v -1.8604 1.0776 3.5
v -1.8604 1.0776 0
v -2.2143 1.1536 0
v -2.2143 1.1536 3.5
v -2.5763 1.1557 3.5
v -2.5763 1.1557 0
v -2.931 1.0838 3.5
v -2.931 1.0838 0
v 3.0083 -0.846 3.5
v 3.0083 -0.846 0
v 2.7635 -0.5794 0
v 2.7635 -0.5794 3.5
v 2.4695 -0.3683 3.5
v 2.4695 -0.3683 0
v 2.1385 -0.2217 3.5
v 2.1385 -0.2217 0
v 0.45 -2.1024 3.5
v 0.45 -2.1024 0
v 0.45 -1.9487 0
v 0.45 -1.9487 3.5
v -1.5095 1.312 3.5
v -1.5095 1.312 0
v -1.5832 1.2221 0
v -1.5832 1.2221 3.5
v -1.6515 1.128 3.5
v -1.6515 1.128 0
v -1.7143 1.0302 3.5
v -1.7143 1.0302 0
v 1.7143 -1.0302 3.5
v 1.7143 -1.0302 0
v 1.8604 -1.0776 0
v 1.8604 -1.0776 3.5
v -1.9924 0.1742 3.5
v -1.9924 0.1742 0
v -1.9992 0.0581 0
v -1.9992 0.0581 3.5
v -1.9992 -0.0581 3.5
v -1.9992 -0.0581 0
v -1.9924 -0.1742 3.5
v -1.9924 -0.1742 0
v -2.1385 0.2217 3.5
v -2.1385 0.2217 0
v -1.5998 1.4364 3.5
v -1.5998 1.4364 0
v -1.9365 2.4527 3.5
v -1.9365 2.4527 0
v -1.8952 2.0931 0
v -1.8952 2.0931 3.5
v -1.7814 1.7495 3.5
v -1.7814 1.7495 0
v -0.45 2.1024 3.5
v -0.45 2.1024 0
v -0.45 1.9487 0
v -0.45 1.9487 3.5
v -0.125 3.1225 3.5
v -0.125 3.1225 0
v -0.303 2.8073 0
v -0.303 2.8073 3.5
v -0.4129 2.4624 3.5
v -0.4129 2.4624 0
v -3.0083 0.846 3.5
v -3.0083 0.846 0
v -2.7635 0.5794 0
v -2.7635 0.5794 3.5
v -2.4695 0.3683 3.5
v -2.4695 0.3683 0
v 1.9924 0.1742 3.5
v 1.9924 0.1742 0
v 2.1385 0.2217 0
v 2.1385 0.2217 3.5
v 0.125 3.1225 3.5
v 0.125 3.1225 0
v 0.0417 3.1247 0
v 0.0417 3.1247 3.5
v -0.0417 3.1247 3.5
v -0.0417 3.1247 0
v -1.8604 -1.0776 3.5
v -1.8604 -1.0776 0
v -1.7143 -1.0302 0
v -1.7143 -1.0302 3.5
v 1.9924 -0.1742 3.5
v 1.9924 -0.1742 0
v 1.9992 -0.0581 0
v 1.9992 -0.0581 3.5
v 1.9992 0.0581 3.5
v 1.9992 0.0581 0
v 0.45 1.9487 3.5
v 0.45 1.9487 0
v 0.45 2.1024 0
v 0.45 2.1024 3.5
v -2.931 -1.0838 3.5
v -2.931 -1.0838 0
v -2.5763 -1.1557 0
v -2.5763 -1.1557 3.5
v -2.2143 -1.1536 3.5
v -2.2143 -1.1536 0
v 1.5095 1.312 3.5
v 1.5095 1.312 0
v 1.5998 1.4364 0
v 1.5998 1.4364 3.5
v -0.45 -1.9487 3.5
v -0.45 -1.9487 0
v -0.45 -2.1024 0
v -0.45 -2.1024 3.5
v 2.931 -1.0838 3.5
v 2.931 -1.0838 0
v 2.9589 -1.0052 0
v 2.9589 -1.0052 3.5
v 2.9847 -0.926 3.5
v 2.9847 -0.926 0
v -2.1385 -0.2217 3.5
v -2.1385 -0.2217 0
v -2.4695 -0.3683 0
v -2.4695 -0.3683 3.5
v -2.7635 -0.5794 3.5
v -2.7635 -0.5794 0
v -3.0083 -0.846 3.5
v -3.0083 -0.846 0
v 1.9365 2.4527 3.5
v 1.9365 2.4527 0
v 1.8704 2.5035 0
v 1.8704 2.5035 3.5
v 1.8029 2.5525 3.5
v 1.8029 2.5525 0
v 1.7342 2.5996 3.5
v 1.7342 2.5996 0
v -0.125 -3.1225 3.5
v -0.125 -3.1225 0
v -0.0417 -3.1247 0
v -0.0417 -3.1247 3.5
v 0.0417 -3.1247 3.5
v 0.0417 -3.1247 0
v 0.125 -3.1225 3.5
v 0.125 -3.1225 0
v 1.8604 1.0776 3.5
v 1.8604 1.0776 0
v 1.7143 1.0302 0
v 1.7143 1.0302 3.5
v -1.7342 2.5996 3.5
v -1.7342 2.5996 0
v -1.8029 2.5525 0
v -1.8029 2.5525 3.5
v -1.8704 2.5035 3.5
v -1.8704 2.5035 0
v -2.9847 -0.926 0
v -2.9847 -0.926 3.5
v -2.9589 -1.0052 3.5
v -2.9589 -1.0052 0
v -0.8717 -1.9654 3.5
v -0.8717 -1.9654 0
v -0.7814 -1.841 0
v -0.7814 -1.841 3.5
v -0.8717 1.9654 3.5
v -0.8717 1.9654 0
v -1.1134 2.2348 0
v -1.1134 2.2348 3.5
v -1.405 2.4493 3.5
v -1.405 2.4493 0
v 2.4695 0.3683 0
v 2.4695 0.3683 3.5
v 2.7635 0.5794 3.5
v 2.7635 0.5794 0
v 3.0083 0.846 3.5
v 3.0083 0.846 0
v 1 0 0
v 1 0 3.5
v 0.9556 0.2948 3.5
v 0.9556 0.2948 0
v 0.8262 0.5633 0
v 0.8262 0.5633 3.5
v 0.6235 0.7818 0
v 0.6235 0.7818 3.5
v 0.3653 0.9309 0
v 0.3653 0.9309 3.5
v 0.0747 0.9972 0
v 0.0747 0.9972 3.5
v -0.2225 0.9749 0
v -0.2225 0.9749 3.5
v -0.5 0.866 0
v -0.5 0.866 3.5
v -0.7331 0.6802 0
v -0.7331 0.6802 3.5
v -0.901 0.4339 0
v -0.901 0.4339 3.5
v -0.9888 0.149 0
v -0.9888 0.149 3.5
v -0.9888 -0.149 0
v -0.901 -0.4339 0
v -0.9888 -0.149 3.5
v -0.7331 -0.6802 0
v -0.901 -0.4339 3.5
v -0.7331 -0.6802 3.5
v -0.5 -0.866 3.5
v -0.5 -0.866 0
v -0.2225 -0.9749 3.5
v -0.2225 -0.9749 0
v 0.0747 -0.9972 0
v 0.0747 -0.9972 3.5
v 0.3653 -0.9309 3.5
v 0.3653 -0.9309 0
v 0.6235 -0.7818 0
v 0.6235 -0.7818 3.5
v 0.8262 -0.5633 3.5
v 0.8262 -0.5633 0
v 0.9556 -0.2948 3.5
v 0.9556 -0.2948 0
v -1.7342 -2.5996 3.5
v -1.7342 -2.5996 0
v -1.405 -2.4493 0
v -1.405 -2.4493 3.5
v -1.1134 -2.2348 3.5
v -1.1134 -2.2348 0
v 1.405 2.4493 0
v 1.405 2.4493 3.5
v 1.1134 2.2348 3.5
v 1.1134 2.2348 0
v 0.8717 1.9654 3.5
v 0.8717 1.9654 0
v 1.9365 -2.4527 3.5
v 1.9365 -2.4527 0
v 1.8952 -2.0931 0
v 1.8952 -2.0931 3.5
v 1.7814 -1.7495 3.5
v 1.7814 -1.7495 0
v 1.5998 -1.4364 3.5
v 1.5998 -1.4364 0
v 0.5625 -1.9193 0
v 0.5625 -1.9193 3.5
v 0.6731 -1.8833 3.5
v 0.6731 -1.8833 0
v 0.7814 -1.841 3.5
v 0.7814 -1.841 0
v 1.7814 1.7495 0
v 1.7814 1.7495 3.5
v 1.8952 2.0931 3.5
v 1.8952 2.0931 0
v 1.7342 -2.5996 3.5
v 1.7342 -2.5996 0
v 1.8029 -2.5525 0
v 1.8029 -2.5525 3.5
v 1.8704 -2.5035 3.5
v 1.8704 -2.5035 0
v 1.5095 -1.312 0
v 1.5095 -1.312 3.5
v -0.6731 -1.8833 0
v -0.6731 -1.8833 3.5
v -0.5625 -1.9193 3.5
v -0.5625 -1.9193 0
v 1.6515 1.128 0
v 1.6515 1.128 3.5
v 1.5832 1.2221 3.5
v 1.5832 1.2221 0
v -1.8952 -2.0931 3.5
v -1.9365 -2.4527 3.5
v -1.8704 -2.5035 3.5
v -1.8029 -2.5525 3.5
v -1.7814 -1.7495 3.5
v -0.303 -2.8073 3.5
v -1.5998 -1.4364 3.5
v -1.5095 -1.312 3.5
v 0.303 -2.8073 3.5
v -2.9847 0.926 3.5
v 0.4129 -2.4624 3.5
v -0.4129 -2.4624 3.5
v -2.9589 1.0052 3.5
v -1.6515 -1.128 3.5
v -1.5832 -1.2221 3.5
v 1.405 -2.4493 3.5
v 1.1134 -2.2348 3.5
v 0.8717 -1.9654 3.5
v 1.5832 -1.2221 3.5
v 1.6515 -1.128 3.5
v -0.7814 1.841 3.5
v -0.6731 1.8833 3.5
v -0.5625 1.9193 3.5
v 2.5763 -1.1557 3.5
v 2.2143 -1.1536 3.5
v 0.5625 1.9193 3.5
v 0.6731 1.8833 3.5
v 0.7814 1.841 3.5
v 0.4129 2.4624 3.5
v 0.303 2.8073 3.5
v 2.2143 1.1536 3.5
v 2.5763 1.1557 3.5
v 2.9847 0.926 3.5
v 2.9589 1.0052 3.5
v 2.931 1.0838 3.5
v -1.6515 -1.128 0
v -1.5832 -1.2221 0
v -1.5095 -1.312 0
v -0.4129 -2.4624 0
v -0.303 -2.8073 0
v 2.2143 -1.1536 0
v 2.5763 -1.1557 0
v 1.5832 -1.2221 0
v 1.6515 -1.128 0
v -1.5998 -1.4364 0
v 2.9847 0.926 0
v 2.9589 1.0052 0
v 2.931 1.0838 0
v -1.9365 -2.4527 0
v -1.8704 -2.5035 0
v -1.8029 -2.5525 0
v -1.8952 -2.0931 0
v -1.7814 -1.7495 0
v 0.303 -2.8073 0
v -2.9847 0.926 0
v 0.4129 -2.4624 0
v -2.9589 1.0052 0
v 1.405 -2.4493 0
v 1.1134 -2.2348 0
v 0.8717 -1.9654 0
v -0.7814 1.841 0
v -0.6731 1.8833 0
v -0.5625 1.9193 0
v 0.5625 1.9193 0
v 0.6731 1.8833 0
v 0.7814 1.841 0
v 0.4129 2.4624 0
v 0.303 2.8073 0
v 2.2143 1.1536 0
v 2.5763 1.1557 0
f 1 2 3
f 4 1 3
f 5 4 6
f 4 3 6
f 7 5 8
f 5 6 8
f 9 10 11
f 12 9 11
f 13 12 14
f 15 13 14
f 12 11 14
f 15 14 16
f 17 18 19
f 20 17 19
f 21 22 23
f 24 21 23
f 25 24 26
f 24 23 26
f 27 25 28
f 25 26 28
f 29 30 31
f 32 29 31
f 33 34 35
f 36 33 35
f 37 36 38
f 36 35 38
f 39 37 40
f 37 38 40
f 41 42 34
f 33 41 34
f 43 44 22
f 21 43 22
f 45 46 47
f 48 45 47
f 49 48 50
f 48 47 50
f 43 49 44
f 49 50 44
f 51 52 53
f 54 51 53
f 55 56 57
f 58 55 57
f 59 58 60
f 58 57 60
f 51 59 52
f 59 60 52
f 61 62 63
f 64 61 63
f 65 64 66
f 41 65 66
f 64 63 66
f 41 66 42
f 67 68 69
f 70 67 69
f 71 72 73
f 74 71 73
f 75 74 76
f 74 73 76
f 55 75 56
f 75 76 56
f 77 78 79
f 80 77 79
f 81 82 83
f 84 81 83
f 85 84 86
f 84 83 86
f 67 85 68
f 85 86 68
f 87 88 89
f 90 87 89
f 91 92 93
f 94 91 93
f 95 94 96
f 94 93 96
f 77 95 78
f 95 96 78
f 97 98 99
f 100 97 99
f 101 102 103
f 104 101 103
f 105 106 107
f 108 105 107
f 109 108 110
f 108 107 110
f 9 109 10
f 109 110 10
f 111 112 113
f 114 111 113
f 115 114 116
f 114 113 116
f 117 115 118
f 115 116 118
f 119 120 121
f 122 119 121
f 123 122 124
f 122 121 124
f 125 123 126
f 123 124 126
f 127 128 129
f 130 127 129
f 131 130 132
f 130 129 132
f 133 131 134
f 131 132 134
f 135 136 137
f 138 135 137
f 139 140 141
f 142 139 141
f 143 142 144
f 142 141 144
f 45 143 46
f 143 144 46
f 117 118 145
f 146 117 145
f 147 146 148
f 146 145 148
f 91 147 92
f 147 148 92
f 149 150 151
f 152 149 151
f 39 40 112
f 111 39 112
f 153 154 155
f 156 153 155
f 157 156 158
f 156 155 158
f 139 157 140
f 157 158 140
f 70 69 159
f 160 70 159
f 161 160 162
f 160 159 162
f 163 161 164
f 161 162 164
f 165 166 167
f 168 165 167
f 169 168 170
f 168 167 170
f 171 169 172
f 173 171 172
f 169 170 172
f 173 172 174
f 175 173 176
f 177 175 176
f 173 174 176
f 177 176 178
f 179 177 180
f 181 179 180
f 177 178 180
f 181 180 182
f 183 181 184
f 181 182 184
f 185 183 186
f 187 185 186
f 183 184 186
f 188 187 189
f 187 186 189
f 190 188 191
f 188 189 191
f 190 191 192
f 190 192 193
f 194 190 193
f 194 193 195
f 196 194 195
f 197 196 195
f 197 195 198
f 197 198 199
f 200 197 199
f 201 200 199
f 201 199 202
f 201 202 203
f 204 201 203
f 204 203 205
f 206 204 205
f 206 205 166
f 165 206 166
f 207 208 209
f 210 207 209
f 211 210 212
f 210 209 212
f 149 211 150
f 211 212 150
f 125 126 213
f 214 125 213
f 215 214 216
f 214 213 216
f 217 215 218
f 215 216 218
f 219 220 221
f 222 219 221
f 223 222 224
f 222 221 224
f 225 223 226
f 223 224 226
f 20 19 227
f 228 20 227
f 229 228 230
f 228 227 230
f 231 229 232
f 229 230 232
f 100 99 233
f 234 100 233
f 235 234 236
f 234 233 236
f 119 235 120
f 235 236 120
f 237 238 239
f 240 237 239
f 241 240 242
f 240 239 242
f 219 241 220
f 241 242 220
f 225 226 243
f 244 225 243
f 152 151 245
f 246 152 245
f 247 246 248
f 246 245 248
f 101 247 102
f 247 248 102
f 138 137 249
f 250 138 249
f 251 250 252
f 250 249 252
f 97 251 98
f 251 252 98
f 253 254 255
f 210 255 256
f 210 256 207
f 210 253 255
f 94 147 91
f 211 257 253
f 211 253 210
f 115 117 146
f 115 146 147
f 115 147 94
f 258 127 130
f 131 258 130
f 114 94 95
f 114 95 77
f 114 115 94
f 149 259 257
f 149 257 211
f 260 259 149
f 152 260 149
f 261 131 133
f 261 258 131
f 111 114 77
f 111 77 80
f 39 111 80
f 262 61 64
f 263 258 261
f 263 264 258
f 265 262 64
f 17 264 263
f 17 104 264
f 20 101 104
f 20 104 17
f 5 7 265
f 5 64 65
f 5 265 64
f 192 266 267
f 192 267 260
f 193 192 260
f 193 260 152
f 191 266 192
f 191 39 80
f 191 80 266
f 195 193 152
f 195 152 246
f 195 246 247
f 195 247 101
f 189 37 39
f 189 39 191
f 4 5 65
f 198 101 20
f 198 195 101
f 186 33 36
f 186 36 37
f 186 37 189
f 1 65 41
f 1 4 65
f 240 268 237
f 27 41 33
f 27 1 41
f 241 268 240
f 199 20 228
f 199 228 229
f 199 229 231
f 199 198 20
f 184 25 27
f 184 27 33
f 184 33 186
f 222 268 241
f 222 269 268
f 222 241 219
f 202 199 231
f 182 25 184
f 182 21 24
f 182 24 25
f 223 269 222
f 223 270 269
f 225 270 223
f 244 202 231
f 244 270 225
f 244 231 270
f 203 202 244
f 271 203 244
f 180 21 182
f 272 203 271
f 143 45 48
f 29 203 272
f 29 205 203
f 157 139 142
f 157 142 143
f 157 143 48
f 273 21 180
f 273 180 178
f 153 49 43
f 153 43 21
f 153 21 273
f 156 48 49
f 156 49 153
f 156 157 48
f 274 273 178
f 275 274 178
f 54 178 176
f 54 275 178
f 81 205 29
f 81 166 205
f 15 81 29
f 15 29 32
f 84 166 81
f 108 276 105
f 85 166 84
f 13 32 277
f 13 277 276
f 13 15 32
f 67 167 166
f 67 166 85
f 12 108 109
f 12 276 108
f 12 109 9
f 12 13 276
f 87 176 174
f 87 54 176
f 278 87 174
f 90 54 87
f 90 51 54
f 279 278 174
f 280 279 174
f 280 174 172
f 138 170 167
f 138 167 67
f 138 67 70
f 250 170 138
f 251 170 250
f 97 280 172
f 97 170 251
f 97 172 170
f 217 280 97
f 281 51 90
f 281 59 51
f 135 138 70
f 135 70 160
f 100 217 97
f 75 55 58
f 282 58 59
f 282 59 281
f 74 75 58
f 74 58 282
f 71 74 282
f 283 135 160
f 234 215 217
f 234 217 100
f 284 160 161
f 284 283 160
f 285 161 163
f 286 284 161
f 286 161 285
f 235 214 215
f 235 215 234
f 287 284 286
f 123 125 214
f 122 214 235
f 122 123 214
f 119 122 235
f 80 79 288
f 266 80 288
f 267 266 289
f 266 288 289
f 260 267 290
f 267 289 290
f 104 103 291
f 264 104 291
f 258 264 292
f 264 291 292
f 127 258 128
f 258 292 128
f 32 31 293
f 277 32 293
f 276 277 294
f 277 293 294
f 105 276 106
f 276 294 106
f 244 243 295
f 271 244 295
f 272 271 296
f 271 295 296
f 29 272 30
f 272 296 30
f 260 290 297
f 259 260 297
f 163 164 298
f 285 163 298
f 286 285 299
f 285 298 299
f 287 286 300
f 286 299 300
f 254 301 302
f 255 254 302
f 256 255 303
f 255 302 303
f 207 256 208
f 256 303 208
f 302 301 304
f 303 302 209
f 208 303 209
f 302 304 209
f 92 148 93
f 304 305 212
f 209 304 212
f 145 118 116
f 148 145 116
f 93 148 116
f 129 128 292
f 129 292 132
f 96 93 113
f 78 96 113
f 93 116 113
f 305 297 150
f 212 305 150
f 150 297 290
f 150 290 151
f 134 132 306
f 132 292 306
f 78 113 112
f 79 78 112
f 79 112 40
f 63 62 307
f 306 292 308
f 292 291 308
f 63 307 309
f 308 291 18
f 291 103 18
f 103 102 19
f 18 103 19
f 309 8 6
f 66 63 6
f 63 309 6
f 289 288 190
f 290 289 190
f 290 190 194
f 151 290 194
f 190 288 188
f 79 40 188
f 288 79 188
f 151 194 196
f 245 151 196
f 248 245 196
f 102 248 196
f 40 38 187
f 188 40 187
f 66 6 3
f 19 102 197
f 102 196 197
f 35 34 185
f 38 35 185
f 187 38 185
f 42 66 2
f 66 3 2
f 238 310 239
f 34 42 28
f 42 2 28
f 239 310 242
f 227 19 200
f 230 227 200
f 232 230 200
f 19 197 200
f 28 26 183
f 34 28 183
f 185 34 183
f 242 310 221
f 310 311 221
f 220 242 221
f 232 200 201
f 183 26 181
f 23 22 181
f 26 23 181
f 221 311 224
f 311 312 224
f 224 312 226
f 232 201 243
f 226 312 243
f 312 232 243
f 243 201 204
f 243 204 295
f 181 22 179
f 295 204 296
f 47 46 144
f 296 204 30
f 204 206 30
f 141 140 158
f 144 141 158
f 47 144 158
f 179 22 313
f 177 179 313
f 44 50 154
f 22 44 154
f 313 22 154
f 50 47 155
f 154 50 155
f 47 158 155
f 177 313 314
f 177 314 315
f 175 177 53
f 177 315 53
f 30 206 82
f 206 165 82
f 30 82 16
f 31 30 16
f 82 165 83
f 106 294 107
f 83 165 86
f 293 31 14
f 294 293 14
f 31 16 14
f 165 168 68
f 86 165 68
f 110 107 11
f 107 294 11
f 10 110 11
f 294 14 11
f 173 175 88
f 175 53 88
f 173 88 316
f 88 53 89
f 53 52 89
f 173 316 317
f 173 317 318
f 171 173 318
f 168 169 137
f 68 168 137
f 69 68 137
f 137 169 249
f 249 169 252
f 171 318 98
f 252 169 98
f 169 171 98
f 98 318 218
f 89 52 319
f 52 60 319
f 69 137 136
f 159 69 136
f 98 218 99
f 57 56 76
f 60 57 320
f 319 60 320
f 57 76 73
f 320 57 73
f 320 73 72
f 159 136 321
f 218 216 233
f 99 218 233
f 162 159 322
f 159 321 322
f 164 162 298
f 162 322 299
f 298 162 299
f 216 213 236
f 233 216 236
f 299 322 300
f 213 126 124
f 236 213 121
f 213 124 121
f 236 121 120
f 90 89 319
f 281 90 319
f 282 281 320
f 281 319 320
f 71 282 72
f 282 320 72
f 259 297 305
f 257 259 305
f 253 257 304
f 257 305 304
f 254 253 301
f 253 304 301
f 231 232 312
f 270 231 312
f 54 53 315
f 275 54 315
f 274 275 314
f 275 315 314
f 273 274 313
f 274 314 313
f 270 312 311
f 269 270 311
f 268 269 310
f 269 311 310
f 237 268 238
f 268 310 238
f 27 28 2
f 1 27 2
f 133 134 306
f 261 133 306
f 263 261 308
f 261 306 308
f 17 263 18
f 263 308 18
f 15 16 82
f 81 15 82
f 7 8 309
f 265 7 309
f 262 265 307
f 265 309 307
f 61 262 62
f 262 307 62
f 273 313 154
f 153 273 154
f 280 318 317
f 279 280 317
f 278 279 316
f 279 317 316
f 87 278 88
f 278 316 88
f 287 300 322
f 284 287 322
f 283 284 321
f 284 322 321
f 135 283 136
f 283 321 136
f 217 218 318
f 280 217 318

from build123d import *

# Parameters (mm, degrees)
ESBO_O1_R                = 2
RESSALTO_EXTRUS_O1_DEPTH = 3.5
ESBO_O2_R                = 1
CORTE_EXTRUS_O1_DEPTH    = 6.573642863


with BuildPart() as part:
    # Esboço1 → Ressalto-extrusão1 (new body)
    with BuildSketch(Plane.XY):
        Circle(ESBO_O1_R)
        with BuildLine():
            ThreePointArc((-1.509485071, 1.312042233), (-1.175570505, 1.618033989), (-0.781369776, 1.84104896))
            Line((-0.781369776, 1.84104896), (-0.871690079, 1.965364192))
            ThreePointArc((-0.871690079, 1.965364192), (-1.253664041, 2.349535361), (-1.734231738, 2.599627912))
            ThreePointArc((-1.734231738, 2.599627912), (-1.836828913, 2.528178107), (-1.936485986, 2.452681599))
            ThreePointArc((-1.936485986, 2.452681599), (-1.847137421, 1.918351711), (-1.599805374, 1.436357465))
            Line((-1.599805374, 1.436357465), (-1.509485071, 1.312042233))
        make_face()
        with BuildLine():
            ThreePointArc((-0.45, 1.948717527), (0, 2), (0.45, 1.948717527))
            Line((0.45, 1.948717527), (0.45, 2.102379604))
            ThreePointArc((0.45, 2.102379604), (0.36678672, 2.63769927), (0.125, 3.122498999))
            ThreePointArc((0.125, 3.122498999), (0, 3.125), (-0.125, 3.122498999))
            ThreePointArc((-0.125, 3.122498999), (-0.36678672, 2.63769927), (-0.45, 2.102379604))
            Line((-0.45, 2.102379604), (-0.45, 1.948717527))
        make_face()
        with BuildLine():
            Line((0.871690079, 1.965364192), (0.781369776, 1.84104896))
            ThreePointArc((0.781369776, 1.84104896), (1.175570505, 1.618033989), (1.509485071, 1.312042233))
            Line((1.509485071, 1.312042233), (1.599805374, 1.436357465))
            ThreePointArc((1.599805374, 1.436357465), (1.847137421, 1.918351711), (1.936485986, 2.452681599))
            ThreePointArc((1.936485986, 2.452681599), (1.836828913, 2.528178107), (1.734231738, 2.599627912))
            ThreePointArc((1.734231738, 2.599627912), (1.253664041, 2.349535361), (0.871690079, 1.965364192))
        make_face()
        with BuildLine():
            Line((1.860424175, 1.077646459), (1.714282855, 1.030162265))
            ThreePointArc((1.714282855, 1.030162265), (1.902113033, 0.618033989), (1.99239815, 0.174211401))
            Line((1.99239815, 0.174211401), (2.13853947, 0.221695594))
            ThreePointArc((2.13853947, 0.221695594), (2.621944409, 0.466259001), (3.008300145, 0.846023191))
            ThreePointArc((3.008300145, 0.846023191), (2.972051613, 0.965678107), (2.931045896, 1.08378732))
            ThreePointArc((2.931045896, 1.08378732), (2.395257749, 1.163928801), (1.860424175, 1.077646459))
        make_face()
        with BuildLine():
            Line((2.13853947, -0.221695594), (1.99239815, -0.174211401))
            ThreePointArc((1.99239815, -0.174211401), (1.902113033, -0.618033989), (1.714282855, -1.030162265))
            Line((1.714282855, -1.030162265), (1.860424175, -1.077646459))
            ThreePointArc((1.860424175, -1.077646459), (2.395257749, -1.163928801), (2.931045896, -1.08378732))
            ThreePointArc((2.931045896, -1.08378732), (2.972051613, -0.965678107), (3.008300145, -0.846023191))
            ThreePointArc((3.008300145, -0.846023191), (2.621944409, -0.466259001), (2.13853947, -0.221695594))
        make_face()
        with BuildLine():
            Line((1.599805374, -1.436357465), (1.509485071, -1.312042233))
            ThreePointArc((1.509485071, -1.312042233), (1.175570505, -1.618033989), (0.781369776, -1.84104896))
            Line((0.781369776, -1.84104896), (0.871690079, -1.965364192))
            ThreePointArc((0.871690079, -1.965364192), (1.253664041, -2.349535361), (1.734231738, -2.599627912))
            ThreePointArc((1.734231738, -2.599627912), (1.836828913, -2.528178107), (1.936485986, -2.452681599))
            ThreePointArc((1.936485986, -2.452681599), (1.847137421, -1.918351711), (1.599805374, -1.436357465))
        make_face()
        with BuildLine():
            Line((0.45, -2.102379604), (0.45, -1.948717527))
            ThreePointArc((0.45, -1.948717527), (0, -2), (-0.45, -1.948717527))
            Line((-0.45, -1.948717527), (-0.45, -2.102379604))
            ThreePointArc((-0.45, -2.102379604), (-0.36678672, -2.63769927), (-0.125, -3.122498999))
            ThreePointArc((-0.125, -3.122498999), (0, -3.125), (0.125, -3.122498999))
            ThreePointArc((0.125, -3.122498999), (0.36678672, -2.63769927), (0.45, -2.102379604))
        make_face()
        with BuildLine():
            ThreePointArc((-0.781369776, -1.84104896), (-1.175570505, -1.618033989), (-1.509485071, -1.312042233))
            Line((-1.509485071, -1.312042233), (-1.599805374, -1.436357465))
            ThreePointArc((-1.599805374, -1.436357465), (-1.847137421, -1.918351711), (-1.936485986, -2.452681599))
            ThreePointArc((-1.936485986, -2.452681599), (-1.836828913, -2.528178107), (-1.734231738, -2.599627912))
            ThreePointArc((-1.734231738, -2.599627912), (-1.253664041, -2.349535361), (-0.871690079, -1.965364192))
            Line((-0.871690079, -1.965364192), (-0.781369776, -1.84104896))
        make_face()
        with BuildLine():
            ThreePointArc((-1.714282855, -1.030162265), (-1.902113033, -0.618033989), (-1.99239815, -0.174211401))
            Line((-1.99239815, -0.174211401), (-2.13853947, -0.221695594))
            ThreePointArc((-2.13853947, -0.221695594), (-2.621944409, -0.466259001), (-3.008300145, -0.846023191))
            ThreePointArc((-3.008300145, -0.846023191), (-2.972051613, -0.965678107), (-2.931045896, -1.08378732))
            ThreePointArc((-2.931045896, -1.08378732), (-2.395257749, -1.163928801), (-1.860424175, -1.077646459))
            Line((-1.860424175, -1.077646459), (-1.714282855, -1.030162265))
        make_face()
        with BuildLine():
            ThreePointArc((-1.99239815, 0.174211401), (-1.902113033, 0.618033989), (-1.714282855, 1.030162265))
            Line((-1.714282855, 1.030162265), (-1.860424175, 1.077646459))
            ThreePointArc((-1.860424175, 1.077646459), (-2.395257749, 1.163928801), (-2.931045896, 1.08378732))
            ThreePointArc((-2.931045896, 1.08378732), (-2.972051613, 0.965678107), (-3.008300145, 0.846023191))
            ThreePointArc((-3.008300145, 0.846023191), (-2.621944409, 0.466259001), (-2.13853947, 0.221695594))
            Line((-2.13853947, 0.221695594), (-1.99239815, 0.174211401))
        make_face()
    extrude(amount=RESSALTO_EXTRUS_O1_DEPTH)

    # Esboço2 → Corte-extrusão1 (cut, through all)
    with BuildSketch(Plane.XY.offset(3.5)):
        Circle(ESBO_O2_R)
    extrude(amount=-CORTE_EXTRUS_O1_DEPTH, mode=Mode.SUBTRACT)


solid = part.part
